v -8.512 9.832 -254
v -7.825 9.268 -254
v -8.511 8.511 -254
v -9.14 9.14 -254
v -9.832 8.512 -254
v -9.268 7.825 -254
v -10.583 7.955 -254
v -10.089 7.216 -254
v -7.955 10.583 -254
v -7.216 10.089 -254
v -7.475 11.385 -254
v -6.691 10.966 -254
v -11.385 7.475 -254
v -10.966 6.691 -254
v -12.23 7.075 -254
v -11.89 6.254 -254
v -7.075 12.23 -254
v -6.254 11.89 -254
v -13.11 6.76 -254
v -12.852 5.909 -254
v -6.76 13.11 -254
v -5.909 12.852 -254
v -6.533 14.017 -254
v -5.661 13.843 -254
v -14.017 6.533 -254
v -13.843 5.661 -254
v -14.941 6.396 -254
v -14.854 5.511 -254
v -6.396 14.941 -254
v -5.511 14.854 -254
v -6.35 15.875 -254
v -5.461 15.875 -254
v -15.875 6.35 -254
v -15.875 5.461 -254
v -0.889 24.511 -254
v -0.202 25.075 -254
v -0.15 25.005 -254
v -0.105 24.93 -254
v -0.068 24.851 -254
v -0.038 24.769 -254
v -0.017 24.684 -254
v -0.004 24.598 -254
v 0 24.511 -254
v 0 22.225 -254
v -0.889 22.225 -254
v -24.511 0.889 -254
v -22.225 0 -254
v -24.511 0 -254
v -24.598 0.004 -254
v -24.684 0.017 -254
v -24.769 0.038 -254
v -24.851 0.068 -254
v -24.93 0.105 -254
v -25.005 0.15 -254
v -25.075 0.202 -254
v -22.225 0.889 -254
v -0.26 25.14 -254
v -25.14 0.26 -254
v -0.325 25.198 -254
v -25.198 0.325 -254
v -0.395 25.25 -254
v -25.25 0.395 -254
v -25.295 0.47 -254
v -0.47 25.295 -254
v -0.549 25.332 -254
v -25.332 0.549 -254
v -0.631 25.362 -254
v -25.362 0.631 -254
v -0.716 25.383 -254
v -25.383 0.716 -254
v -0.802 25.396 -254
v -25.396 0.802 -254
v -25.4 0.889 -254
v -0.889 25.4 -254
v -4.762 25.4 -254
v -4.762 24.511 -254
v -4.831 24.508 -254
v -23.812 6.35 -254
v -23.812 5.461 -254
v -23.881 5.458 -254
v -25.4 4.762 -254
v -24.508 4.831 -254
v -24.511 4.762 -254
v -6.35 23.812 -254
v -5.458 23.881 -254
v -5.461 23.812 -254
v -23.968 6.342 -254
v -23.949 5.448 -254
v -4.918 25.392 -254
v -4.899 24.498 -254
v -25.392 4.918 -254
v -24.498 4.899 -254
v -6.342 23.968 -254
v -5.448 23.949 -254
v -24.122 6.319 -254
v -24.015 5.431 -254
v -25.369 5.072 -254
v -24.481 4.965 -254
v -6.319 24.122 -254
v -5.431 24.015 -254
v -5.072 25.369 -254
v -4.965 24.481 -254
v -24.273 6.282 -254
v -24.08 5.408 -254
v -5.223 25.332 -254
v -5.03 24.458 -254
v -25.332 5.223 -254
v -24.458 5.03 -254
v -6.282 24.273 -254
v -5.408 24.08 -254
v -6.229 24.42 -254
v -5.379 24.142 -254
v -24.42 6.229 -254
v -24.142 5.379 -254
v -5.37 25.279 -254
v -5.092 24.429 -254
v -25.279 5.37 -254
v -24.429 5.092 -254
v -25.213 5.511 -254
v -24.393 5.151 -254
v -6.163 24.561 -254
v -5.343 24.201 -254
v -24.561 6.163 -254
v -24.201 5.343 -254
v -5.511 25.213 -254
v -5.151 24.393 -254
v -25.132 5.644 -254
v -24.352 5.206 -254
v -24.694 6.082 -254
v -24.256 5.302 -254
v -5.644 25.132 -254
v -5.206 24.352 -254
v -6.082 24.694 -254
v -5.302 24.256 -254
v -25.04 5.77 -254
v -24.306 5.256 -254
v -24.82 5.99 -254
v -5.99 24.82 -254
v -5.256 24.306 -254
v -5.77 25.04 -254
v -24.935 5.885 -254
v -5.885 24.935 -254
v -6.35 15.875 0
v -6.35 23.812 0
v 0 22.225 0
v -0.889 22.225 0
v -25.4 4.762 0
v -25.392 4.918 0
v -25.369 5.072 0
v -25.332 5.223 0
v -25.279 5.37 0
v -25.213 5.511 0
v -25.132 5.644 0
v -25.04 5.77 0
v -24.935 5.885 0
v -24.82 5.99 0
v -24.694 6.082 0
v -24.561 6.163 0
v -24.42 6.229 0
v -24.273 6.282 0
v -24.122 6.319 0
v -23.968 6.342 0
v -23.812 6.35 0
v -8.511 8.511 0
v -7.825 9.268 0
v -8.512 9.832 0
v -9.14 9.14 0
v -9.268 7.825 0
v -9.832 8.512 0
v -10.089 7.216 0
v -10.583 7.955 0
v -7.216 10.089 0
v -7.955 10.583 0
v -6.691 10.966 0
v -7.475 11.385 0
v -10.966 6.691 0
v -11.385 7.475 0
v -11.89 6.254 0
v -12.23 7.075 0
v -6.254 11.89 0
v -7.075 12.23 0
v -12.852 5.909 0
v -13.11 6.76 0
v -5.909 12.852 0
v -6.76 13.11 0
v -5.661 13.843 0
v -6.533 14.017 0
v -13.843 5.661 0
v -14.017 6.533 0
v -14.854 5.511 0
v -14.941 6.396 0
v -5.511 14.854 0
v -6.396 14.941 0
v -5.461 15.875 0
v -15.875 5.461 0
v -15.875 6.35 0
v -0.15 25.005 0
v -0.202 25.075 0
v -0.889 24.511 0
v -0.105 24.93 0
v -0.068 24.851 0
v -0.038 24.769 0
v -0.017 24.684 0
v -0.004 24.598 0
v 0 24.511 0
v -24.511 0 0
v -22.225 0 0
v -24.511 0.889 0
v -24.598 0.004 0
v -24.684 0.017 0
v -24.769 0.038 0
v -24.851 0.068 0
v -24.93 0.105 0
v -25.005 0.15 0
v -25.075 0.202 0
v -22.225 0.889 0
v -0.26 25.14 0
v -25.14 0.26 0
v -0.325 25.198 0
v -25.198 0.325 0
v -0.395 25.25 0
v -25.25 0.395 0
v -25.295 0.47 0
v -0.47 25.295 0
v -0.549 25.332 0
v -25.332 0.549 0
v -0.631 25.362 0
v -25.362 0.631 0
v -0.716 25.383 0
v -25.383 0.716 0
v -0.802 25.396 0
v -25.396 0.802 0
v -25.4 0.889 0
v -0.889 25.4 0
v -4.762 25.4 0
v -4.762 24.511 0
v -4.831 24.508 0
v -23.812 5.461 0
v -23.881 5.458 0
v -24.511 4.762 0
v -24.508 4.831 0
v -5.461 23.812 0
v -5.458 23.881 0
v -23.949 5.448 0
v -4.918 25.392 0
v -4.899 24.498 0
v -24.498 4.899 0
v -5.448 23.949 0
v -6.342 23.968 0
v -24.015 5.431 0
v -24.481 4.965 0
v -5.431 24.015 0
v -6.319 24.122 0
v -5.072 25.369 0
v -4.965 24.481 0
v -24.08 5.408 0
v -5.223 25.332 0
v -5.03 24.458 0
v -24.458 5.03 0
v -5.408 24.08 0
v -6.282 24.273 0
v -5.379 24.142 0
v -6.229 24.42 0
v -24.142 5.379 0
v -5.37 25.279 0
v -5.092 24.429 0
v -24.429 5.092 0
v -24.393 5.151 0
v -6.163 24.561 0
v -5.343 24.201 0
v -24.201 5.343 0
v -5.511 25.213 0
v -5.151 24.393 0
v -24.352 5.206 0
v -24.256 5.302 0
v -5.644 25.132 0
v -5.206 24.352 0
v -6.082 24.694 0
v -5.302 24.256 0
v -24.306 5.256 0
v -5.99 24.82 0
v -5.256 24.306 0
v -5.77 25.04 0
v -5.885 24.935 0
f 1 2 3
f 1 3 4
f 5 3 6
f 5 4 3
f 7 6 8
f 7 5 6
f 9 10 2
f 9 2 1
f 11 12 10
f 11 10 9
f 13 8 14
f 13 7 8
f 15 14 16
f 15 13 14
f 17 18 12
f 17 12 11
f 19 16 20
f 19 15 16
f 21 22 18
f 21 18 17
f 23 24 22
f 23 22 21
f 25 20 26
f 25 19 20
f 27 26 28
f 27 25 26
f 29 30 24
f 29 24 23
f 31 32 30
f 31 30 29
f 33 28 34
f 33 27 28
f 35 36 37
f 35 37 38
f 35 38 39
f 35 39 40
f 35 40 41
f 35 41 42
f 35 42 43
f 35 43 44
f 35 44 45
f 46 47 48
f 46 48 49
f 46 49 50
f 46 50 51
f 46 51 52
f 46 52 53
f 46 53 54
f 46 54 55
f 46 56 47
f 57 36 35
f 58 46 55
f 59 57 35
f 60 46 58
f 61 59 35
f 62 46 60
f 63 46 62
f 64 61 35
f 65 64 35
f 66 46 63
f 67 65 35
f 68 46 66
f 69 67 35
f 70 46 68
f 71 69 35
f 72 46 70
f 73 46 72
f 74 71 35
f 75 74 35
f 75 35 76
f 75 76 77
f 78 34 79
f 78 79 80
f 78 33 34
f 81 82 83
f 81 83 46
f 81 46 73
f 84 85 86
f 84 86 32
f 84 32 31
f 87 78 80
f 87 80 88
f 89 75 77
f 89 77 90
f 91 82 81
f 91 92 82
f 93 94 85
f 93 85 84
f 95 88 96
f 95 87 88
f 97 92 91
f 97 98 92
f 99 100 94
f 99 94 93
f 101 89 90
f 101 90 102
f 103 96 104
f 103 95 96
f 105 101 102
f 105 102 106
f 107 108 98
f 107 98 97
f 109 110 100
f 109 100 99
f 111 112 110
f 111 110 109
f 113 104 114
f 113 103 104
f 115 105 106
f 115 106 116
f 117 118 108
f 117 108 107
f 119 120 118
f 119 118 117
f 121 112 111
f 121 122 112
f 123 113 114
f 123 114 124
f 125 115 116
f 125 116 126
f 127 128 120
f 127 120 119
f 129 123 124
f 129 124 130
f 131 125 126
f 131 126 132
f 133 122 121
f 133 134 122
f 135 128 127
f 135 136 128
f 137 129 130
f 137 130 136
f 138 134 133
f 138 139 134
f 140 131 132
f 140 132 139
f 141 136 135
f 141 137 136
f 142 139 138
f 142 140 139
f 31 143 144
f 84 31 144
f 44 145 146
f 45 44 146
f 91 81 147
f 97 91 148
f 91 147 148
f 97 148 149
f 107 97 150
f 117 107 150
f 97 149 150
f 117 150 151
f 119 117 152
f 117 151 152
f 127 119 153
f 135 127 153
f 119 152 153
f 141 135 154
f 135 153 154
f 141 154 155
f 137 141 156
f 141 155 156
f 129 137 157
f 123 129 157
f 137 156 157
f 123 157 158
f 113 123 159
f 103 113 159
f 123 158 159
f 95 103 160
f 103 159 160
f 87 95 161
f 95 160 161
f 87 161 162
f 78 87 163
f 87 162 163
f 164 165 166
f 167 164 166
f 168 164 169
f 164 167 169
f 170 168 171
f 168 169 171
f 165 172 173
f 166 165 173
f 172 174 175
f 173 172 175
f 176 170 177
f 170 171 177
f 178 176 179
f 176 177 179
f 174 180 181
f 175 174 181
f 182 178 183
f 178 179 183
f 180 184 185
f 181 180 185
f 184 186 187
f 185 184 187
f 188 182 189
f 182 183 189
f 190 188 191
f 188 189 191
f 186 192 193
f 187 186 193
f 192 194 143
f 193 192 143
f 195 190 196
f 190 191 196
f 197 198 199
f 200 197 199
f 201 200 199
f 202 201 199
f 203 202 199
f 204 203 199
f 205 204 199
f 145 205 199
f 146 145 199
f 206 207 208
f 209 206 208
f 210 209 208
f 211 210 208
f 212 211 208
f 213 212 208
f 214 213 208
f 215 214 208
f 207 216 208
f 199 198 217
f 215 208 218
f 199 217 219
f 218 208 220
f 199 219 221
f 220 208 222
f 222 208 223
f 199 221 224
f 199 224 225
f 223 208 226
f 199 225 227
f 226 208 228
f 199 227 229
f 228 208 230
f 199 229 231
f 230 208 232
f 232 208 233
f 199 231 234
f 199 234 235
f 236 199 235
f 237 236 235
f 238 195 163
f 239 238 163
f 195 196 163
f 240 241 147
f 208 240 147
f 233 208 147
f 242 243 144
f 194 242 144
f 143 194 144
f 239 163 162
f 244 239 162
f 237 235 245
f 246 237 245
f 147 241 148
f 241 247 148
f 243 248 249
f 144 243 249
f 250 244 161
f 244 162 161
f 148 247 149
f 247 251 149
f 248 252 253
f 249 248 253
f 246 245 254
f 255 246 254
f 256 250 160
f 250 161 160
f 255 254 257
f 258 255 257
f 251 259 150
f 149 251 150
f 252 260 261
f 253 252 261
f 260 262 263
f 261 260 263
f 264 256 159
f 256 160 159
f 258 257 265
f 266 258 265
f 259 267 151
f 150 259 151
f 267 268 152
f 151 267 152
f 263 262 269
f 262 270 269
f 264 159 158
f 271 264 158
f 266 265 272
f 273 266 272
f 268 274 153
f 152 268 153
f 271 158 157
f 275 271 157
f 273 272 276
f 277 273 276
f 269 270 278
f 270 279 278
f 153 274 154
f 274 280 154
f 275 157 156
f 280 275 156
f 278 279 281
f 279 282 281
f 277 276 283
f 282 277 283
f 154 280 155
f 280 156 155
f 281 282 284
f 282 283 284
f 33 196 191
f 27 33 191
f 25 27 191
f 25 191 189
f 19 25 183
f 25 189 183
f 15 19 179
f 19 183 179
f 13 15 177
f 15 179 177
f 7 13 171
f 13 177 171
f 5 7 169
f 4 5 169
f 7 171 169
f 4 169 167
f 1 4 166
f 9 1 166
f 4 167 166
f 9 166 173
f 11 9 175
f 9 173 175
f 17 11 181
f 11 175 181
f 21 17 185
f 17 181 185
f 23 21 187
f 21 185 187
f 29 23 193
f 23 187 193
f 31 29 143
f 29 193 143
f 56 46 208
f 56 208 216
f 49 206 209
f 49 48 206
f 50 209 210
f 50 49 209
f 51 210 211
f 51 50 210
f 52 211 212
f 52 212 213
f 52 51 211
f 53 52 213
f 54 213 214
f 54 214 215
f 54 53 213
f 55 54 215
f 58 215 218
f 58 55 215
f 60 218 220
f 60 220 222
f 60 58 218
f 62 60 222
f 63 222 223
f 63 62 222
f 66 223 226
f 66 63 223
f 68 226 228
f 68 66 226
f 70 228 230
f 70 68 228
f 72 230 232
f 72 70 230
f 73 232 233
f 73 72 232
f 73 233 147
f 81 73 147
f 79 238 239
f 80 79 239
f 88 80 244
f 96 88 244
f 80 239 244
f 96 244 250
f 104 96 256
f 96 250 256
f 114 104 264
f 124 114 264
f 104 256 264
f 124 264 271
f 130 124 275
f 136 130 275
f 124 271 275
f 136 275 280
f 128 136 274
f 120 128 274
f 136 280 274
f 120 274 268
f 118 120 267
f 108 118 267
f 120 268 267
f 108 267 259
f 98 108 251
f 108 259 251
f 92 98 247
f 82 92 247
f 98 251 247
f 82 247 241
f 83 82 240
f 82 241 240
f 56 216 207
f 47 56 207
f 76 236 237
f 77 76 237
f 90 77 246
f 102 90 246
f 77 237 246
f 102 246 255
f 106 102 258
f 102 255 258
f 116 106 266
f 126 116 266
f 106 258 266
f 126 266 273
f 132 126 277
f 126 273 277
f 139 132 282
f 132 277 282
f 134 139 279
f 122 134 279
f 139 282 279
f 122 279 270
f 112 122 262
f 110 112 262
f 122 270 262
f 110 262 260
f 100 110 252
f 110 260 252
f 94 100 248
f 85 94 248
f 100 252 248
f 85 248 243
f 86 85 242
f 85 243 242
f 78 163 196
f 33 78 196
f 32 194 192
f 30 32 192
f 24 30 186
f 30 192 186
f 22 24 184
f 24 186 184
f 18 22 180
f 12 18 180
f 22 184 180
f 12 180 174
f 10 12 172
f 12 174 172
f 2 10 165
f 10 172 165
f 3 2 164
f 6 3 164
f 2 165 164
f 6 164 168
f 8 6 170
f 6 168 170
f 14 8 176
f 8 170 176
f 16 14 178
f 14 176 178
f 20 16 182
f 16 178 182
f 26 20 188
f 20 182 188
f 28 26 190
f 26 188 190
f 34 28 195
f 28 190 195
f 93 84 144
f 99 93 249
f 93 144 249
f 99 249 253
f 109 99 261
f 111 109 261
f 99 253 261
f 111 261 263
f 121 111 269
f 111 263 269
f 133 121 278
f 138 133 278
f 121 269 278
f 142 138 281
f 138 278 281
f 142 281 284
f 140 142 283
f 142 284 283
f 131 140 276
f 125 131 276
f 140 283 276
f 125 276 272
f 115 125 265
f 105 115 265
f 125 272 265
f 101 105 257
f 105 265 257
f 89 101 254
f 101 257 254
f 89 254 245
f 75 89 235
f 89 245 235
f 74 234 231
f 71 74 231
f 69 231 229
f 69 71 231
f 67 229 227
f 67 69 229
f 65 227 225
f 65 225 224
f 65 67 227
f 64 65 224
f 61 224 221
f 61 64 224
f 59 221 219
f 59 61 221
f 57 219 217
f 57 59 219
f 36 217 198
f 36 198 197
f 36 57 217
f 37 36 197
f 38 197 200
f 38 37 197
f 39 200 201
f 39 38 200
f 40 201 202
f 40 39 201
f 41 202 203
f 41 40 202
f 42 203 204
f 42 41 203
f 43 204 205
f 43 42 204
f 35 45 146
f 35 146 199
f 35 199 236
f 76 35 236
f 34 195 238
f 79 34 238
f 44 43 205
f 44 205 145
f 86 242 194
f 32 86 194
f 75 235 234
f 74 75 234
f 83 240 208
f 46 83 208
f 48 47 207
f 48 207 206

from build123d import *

# Parameters (mm, degrees)
EXTRUDE_THIN1_DEPTH = 254
FILLET1_R           = 0.889


with BuildPart() as part:
    # Sketch1 → Extrude-Thin1 (new body)
    with BuildSketch(Plane.XY):
        with BuildLine():
            Line((-22.225, 0), (-25.4, 0))
            Line((-25.4, 0), (-25.4, 4.7625))
            ThreePointArc((-25.4, 4.7625), (-24.935032015, 5.885032015), (-23.8125, 6.35))
            Line((-23.8125, 6.35), (-15.875, 6.35))
            ThreePointArc((-15.875, 6.35), (-9.139807909, 9.139807909), (-6.35, 15.875))
            Line((-6.35, 15.875), (-6.35, 23.8125))
            ThreePointArc((-6.35, 23.8125), (-5.885032015, 24.935032015), (-4.7625, 25.4))
            Line((-4.7625, 25.4), (0, 25.4))
            Line((0, 25.4), (0, 22.225))
            Line((0, 22.225), (-0.889, 22.225))
            Line((-0.889, 22.225), (-0.889, 24.511))
            Line((-0.889, 24.511), (-4.7625, 24.511))
            ThreePointArc((-4.7625, 24.511), (-5.256414087, 24.306414087), (-5.461, 23.8125))
            Line((-5.461, 23.8125), (-5.461, 15.875))
            ThreePointArc((-5.461, 15.875), (-8.511189981, 8.511189981), (-15.875, 5.461))
            Line((-15.875, 5.461), (-23.8125, 5.461))
            ThreePointArc((-23.8125, 5.461), (-24.306414087, 5.256414087), (-24.511, 4.7625))
            Line((-24.511, 4.7625), (-24.511, 0.889))
            Line((-24.511, 0.889), (-22.225, 0.889))
            Line((-22.225, 0.889), (-22.225, 0))
        make_face()
    extrude(amount=-EXTRUDE_THIN1_DEPTH)

    # Fillet1
    fillet1_edges = [part.edges().sort_by_distance(p)[0] for p in [
        (-25.4, 0, -127),
        (0, 25.4, -127),
    ]]
    fillet(fillet1_edges, radius=FILLET1_R)


solid = part.part
